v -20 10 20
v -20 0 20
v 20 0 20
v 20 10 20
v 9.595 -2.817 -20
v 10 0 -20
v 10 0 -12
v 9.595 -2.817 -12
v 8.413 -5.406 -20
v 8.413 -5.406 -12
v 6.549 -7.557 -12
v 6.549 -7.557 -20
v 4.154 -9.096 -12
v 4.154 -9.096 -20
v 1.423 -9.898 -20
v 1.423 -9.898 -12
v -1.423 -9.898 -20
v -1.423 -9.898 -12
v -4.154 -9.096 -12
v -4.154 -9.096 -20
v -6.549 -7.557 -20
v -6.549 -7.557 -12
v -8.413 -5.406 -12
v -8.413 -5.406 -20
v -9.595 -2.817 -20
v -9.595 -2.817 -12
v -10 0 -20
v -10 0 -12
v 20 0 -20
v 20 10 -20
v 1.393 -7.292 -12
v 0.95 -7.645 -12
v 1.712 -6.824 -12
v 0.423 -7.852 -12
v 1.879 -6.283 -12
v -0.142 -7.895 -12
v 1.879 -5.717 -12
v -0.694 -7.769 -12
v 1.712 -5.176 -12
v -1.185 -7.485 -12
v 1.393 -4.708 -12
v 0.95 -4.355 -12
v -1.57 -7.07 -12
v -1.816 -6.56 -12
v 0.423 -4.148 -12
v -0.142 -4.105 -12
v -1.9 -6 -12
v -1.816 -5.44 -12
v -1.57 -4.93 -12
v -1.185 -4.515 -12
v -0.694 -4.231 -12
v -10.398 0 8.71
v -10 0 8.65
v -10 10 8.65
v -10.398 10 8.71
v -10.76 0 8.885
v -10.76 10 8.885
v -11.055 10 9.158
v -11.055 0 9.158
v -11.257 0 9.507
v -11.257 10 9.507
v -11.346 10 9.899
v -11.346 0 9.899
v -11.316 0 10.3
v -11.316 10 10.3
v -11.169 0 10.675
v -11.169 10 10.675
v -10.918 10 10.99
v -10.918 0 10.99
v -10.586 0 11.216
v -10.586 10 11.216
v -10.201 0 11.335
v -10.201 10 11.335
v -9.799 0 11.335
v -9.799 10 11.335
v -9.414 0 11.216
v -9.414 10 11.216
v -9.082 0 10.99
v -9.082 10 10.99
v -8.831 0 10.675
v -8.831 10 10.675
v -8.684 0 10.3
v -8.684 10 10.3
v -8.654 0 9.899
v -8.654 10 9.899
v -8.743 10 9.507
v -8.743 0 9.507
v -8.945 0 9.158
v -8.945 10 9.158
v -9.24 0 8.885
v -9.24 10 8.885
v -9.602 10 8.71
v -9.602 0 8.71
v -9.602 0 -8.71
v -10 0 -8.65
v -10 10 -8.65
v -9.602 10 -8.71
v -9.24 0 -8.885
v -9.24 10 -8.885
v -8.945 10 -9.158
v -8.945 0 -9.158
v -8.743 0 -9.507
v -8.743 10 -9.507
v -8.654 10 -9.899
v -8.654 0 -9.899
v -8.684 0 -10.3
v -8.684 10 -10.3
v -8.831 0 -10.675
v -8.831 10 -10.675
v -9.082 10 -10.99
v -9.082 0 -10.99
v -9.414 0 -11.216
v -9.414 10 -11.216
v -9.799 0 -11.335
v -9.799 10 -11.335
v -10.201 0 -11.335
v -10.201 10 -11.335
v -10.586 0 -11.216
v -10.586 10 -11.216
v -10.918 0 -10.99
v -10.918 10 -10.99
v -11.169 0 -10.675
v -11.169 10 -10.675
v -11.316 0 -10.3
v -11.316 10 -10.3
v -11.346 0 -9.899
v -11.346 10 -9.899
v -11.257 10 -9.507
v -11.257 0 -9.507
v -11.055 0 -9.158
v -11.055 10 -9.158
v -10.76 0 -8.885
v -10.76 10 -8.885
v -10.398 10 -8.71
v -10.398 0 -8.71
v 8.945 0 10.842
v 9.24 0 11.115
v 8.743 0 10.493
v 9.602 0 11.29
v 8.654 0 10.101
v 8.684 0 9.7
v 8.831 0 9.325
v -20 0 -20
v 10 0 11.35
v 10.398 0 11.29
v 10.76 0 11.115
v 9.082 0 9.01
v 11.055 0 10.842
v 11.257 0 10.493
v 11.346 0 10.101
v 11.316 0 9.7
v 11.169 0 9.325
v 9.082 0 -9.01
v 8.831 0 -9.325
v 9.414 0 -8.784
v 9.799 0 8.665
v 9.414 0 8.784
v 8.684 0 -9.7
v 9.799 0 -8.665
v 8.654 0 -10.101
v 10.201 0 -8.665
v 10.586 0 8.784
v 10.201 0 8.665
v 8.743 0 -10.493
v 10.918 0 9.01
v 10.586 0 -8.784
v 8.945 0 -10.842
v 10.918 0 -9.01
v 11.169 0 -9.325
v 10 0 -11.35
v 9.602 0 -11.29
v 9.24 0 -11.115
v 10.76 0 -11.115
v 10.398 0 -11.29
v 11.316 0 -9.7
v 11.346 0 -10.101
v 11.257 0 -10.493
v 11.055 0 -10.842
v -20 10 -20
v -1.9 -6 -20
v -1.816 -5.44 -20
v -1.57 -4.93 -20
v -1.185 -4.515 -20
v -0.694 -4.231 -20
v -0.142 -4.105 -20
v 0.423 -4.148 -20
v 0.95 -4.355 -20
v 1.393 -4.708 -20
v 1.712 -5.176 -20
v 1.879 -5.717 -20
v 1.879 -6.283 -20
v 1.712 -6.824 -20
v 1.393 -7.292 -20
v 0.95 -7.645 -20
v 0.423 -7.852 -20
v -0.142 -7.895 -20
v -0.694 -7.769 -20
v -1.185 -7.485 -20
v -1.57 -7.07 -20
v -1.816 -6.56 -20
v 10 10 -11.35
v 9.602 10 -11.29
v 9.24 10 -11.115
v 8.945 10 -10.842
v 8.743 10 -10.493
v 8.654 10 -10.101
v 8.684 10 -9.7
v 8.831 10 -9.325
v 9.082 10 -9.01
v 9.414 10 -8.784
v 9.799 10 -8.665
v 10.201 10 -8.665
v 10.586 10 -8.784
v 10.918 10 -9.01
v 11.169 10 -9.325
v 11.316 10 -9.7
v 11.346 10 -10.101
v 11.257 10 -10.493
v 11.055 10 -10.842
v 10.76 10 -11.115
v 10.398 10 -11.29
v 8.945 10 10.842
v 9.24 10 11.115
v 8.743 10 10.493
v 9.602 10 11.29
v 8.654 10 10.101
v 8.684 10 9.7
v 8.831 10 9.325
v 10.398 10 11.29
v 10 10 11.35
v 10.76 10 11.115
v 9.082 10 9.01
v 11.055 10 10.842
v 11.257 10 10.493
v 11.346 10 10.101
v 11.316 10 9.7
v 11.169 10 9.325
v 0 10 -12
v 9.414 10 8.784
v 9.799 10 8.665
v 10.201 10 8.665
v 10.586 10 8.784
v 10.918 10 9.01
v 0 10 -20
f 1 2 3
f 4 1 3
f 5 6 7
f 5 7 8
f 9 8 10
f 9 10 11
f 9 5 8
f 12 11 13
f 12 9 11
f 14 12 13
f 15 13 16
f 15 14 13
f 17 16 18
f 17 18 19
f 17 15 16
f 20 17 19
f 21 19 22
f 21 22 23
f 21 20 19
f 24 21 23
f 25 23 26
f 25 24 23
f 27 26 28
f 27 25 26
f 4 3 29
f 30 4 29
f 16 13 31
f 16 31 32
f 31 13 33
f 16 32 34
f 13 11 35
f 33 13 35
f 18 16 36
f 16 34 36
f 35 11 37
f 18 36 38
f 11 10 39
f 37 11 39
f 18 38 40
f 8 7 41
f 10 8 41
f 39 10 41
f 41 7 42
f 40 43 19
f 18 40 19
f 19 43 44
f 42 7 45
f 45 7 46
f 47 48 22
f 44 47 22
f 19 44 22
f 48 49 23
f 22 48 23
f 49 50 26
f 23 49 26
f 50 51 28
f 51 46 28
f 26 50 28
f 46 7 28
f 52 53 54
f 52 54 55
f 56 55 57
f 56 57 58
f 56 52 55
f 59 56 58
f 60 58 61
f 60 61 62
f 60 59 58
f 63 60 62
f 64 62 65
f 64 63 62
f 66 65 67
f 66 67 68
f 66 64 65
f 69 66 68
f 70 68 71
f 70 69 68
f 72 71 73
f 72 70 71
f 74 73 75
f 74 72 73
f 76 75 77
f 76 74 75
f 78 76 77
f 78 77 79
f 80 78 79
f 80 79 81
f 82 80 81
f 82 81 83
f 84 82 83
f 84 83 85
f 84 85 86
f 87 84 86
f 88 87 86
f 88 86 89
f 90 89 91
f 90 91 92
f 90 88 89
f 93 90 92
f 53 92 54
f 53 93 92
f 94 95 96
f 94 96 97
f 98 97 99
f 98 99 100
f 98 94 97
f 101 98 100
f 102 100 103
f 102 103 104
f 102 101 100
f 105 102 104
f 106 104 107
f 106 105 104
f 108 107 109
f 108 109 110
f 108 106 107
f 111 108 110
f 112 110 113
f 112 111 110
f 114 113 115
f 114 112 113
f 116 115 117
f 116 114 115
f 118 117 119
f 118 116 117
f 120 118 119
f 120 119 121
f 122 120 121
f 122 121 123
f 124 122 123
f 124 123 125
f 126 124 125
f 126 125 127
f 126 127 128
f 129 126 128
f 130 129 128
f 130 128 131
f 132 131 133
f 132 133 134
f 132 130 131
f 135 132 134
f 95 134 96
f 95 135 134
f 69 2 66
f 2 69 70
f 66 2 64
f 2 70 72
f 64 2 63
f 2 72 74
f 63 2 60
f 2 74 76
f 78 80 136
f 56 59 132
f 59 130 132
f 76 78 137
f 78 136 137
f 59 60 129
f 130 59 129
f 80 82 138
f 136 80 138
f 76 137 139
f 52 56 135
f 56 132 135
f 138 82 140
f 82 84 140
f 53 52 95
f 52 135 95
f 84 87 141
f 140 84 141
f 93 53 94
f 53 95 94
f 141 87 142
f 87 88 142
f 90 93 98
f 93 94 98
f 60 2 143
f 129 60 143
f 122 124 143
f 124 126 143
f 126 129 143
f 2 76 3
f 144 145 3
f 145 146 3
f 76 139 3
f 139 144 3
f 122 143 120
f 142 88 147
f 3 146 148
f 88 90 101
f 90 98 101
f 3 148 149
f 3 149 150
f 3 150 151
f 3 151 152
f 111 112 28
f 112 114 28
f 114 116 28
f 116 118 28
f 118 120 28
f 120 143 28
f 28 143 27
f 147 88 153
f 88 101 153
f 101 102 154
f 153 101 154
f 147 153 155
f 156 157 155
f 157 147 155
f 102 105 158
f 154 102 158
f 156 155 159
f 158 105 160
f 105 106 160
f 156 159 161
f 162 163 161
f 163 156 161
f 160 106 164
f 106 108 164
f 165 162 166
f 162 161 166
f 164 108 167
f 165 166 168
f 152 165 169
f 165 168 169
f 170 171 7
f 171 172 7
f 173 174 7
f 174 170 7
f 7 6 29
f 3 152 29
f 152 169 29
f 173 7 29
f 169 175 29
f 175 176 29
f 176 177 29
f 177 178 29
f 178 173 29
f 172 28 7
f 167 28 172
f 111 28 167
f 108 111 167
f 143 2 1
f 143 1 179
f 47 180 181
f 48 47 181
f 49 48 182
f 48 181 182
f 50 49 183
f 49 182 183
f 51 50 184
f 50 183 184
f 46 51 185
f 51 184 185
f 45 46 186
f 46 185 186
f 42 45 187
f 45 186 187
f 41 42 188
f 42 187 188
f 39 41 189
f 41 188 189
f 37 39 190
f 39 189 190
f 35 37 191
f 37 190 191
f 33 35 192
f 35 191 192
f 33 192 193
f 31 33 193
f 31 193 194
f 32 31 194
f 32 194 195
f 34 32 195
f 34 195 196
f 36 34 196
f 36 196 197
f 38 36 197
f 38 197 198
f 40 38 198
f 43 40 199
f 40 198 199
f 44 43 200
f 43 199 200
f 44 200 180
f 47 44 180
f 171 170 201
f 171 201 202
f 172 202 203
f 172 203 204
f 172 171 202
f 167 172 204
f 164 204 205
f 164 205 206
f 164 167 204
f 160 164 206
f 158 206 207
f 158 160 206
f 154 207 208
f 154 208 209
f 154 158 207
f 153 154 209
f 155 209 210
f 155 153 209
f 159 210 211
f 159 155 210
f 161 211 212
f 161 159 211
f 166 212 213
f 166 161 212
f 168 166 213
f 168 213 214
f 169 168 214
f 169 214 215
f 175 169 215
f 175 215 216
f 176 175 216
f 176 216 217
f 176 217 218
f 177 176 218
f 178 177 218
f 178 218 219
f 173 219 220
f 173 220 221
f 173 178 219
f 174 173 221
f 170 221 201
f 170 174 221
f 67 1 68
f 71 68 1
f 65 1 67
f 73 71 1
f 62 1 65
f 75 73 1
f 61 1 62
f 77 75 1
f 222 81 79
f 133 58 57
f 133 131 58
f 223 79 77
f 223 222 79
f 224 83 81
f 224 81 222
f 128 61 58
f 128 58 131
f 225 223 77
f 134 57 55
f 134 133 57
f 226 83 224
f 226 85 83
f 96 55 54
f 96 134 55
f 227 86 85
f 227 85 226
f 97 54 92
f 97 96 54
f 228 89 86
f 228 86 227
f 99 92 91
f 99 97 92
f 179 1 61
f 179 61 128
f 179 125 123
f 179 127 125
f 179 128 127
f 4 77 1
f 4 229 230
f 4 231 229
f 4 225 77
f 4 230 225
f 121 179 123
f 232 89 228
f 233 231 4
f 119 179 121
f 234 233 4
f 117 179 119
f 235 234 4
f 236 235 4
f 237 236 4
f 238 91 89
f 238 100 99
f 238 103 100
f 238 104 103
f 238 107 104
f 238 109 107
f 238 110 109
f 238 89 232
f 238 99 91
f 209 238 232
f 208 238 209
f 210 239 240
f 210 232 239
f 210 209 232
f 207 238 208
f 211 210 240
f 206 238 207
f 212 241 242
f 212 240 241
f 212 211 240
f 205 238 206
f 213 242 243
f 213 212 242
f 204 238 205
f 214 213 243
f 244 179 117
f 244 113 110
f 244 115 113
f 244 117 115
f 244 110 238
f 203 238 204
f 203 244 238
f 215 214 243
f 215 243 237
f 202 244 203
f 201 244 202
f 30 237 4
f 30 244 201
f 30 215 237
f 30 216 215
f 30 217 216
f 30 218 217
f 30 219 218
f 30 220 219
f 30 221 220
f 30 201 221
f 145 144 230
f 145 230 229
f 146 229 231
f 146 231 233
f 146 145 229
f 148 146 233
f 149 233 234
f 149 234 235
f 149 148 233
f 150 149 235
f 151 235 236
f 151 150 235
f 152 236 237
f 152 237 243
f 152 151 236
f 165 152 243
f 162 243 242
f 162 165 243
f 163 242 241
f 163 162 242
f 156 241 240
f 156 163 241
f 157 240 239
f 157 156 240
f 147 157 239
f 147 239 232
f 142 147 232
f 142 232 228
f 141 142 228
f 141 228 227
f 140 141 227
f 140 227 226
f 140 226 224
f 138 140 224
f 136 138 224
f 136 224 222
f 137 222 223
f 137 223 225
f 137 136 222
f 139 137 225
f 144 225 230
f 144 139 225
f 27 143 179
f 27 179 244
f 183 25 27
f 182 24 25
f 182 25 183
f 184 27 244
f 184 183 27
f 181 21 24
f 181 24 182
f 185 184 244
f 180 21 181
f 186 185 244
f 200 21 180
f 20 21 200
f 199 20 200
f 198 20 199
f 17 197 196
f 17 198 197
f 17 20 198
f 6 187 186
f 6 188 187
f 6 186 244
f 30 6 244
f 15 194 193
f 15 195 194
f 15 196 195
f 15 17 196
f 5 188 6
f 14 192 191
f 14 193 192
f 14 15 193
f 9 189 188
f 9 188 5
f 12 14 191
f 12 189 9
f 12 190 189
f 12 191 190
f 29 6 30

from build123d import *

# Parameters (mm, degrees)
CROQUIS1_W              = 40
CROQUIS1_H              = 40
CROQUIS1_R              = 1.35
SALIENTE_EXTRUIR1_DEPTH = 10
CROQUIS2_R              = 10
CROQUIS2_R_2            = 1.9
SALIENTE_EXTRUIR2_DEPTH = 8


with BuildPart() as part:
    # Croquis1 → Saliente-Extruir1 (new body)
    with BuildSketch(Plane(origin=(0, 0, 0), x_dir=(1, 0, 0), z_dir=(0, 1, 0))):
        Rectangle(CROQUIS1_W, CROQUIS1_H)
        with Locations(Location((-10, 10, 0), (0, 0, 270))):
            Circle(CROQUIS1_R, mode=Mode.SUBTRACT)
        with Locations(Location((10, 10, 0), (0, 0, 90))):
            Circle(CROQUIS1_R, mode=Mode.SUBTRACT)
        with Locations(Location((10, -10, 0), (0, 0, 270))):
            Circle(CROQUIS1_R, mode=Mode.SUBTRACT)
        with Locations(Location((-10, -10, 0), (0, 0, 90))):
            Circle(CROQUIS1_R, mode=Mode.SUBTRACT)
    extrude(amount=SALIENTE_EXTRUIR1_DEPTH)

    # Croquis2 → Saliente-Extruir2 (add)
    with BuildSketch(Plane(origin=(0, 0, -20), x_dir=(-1, 0, 0), z_dir=(0, 0, -1))):
        Circle(CROQUIS2_R)
        with Locations((0, -6)):
            Circle(CROQUIS2_R_2, mode=Mode.SUBTRACT)
    extrude(amount=-SALIENTE_EXTRUIR2_DEPTH)


solid = part.part
